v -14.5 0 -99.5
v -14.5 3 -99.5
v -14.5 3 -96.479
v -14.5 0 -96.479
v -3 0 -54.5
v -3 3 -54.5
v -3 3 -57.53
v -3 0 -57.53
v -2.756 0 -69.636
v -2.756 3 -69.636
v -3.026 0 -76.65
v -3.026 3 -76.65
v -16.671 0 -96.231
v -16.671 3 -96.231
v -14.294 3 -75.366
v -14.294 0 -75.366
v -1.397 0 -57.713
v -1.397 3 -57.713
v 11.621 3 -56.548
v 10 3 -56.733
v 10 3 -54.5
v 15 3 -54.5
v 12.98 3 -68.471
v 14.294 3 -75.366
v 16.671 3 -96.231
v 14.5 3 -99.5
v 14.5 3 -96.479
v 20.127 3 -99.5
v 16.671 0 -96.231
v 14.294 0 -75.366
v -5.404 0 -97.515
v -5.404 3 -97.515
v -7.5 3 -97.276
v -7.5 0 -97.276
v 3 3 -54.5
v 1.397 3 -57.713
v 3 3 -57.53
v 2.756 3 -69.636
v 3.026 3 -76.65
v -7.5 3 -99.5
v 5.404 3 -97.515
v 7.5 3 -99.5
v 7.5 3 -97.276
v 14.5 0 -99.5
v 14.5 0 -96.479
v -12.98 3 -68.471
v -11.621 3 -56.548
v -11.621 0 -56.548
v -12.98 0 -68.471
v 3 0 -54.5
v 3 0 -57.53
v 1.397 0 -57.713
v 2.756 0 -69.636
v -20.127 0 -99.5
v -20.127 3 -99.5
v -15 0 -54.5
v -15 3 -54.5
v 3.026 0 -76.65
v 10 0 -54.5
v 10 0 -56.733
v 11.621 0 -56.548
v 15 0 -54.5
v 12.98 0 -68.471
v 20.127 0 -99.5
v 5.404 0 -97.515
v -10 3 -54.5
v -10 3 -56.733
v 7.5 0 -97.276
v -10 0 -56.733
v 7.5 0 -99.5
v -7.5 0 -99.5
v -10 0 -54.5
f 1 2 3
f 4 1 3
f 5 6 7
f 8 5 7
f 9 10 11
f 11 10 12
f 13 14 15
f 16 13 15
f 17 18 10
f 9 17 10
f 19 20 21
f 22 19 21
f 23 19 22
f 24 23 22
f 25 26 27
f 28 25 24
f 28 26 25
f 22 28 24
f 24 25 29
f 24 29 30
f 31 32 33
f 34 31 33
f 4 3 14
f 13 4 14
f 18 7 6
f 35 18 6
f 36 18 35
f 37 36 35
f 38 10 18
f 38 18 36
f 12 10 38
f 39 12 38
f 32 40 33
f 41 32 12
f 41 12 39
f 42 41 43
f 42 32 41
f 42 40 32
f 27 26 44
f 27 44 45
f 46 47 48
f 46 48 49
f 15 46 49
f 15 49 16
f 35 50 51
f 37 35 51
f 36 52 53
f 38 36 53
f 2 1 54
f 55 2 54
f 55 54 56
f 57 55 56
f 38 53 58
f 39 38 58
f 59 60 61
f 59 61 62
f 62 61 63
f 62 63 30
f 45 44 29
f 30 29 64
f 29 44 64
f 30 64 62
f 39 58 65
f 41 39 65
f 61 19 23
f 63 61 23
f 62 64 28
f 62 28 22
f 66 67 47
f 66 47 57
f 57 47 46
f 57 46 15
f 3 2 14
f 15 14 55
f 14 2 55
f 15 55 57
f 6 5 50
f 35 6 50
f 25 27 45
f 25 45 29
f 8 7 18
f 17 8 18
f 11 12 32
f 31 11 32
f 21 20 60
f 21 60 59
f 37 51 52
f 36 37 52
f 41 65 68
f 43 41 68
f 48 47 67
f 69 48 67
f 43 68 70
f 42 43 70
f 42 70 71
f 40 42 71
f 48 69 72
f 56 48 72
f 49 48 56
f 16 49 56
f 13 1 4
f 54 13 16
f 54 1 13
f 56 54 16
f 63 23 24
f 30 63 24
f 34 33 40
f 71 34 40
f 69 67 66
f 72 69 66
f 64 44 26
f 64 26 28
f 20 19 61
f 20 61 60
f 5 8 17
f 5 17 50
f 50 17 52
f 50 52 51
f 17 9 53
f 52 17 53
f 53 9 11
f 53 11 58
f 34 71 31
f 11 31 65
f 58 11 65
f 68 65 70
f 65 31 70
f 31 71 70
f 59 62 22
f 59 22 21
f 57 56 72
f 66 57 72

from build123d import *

# Parameters (mm, degrees)
BOSS_EXTRUDE1_DEPTH = 3
CUT_EXTRUDE1_DEPTH  = 102.55958965
BOSS_EXTRUDE2_DEPTH = 3
CUT_EXTRUDE7_DEPTH  = 102.55958965
CUT_EXTRUDE9_DEPTH  = 102.55958965
MIRROR10_DEPTH      = 3


# Read off the part's stored shape, not the designer's step: Mirror10
with BuildPart() as part:
    # Sketch1 → Boss-Extrude1 (new body)
    with BuildSketch(Plane(origin=(0, 0, 0), x_dir=(1, 0, 0), z_dir=(0, 1, 0))):
        Polygon((-20.127102374, 99.5), (-15, 54.5), (0, 54.5), (0, 99.5), align=None)
    extrude(amount=BOSS_EXTRUDE1_DEPTH)

    # Sketch2 → Cut-Extrude1 (cut, symmetric)
    with BuildSketch(Plane(origin=(0, 3, 0), x_dir=(1, 0, 0), z_dir=(0, 1, 0))):
        Polygon((-12.142737213, 56.488519479), (-0.87563237, 57.772243923), (-5.403760921, 97.515118151), (-16.670865764, 96.231393706), align=None)
    extrude(amount=CUT_EXTRUDE1_DEPTH, both=True, mode=Mode.SUBTRACT)

    # Sketch6 → Boss-Extrude2 (add)
    with BuildSketch(Plane(origin=(0, 3, 0), x_dir=(1, 0, 0), z_dir=(0, 1, 0))):
        Polygon((-12.142737213, 56.488519479), (-11.621111989, 56.547951167), (-12.979550554, 68.470813435), (-14.293598275, 75.366384737), align=None)
    boss_extrude2 = extrude(amount=-BOSS_EXTRUDE2_DEPTH)

    # Mirror3: Boss-Extrude2 across plane
    add(boss_extrude2.mirror(Plane(origin=(0, 0, 0), x_dir=(0.11320321376790746, 0, 0.9935718556765873), z_dir=(0.9935718556765875, 0, -0.11320321376790746))))

    # Sketch7 → Cut-Extrude7 (cut, symmetric)
    with BuildSketch(Plane(origin=(0, 3, 0), x_dir=(1, 0, 0), z_dir=(0, 1, 0))):
        Polygon((-14.5, 99.5), (-14.5, 96.478732618), (-7.5, 97.276281876), (-7.5, 99.5), align=None)
    extrude(amount=CUT_EXTRUDE7_DEPTH, both=True, mode=Mode.SUBTRACT)

    # Sketch14 → Cut-Extrude9 (cut, symmetric)
    with BuildSketch(Plane(origin=(0, 3, 0), x_dir=(1, 0, 0), z_dir=(0, 1, 0))):
        Polygon((-10, 56.732653547), (-10, 54.5), (-3, 54.5), (-3, 57.530202805), align=None)
    extrude(amount=CUT_EXTRUDE9_DEPTH, both=True, mode=Mode.SUBTRACT)


with BuildPart() as cut_extrude9_piece_1:
    # of the separate pieces the step leaves, piece 1, a body of its own (cut_extrude9_pieces)
    add(part.part.solids().sort_by_distance((-20.127102374, 0, -99.5))[0])


with BuildPart() as cut_extrude9_piece_2:
    # of the separate pieces the step leaves, piece 2, a body of its own (cut_extrude9_pieces)
    add(part.part.solids().sort_by_distance((-3, 0, -54.5))[0])

    # Mirror10 outline → Mirror10 (add)
    with BuildSketch(Plane(origin=(0, 0, 0), x_dir=(1, 0, 0), z_dir=(0, 1, 0))):
        Polygon((0, 54.5), (3, 54.5), (3, 57.530202805), (1.397257594, 57.712812236), (2.755696159, 69.635674504), (3.026493432, 76.650109181), (5.403760921, 97.515118151), (7.5, 97.276281876), (7.5, 99.5), (0, 99.5), align=None)
    extrude(amount=MIRROR10_DEPTH)


with BuildPart() as body_3:
    # Mirror12: mirrored copy
    add(cut_extrude9_piece_1.part.mirror(Plane(origin=(0, 0, 0), x_dir=(0, 0, 1), z_dir=(1, 0, 0))))


solid = Compound([cut_extrude9_piece_1.part, cut_extrude9_piece_2.part, body_3.part])
